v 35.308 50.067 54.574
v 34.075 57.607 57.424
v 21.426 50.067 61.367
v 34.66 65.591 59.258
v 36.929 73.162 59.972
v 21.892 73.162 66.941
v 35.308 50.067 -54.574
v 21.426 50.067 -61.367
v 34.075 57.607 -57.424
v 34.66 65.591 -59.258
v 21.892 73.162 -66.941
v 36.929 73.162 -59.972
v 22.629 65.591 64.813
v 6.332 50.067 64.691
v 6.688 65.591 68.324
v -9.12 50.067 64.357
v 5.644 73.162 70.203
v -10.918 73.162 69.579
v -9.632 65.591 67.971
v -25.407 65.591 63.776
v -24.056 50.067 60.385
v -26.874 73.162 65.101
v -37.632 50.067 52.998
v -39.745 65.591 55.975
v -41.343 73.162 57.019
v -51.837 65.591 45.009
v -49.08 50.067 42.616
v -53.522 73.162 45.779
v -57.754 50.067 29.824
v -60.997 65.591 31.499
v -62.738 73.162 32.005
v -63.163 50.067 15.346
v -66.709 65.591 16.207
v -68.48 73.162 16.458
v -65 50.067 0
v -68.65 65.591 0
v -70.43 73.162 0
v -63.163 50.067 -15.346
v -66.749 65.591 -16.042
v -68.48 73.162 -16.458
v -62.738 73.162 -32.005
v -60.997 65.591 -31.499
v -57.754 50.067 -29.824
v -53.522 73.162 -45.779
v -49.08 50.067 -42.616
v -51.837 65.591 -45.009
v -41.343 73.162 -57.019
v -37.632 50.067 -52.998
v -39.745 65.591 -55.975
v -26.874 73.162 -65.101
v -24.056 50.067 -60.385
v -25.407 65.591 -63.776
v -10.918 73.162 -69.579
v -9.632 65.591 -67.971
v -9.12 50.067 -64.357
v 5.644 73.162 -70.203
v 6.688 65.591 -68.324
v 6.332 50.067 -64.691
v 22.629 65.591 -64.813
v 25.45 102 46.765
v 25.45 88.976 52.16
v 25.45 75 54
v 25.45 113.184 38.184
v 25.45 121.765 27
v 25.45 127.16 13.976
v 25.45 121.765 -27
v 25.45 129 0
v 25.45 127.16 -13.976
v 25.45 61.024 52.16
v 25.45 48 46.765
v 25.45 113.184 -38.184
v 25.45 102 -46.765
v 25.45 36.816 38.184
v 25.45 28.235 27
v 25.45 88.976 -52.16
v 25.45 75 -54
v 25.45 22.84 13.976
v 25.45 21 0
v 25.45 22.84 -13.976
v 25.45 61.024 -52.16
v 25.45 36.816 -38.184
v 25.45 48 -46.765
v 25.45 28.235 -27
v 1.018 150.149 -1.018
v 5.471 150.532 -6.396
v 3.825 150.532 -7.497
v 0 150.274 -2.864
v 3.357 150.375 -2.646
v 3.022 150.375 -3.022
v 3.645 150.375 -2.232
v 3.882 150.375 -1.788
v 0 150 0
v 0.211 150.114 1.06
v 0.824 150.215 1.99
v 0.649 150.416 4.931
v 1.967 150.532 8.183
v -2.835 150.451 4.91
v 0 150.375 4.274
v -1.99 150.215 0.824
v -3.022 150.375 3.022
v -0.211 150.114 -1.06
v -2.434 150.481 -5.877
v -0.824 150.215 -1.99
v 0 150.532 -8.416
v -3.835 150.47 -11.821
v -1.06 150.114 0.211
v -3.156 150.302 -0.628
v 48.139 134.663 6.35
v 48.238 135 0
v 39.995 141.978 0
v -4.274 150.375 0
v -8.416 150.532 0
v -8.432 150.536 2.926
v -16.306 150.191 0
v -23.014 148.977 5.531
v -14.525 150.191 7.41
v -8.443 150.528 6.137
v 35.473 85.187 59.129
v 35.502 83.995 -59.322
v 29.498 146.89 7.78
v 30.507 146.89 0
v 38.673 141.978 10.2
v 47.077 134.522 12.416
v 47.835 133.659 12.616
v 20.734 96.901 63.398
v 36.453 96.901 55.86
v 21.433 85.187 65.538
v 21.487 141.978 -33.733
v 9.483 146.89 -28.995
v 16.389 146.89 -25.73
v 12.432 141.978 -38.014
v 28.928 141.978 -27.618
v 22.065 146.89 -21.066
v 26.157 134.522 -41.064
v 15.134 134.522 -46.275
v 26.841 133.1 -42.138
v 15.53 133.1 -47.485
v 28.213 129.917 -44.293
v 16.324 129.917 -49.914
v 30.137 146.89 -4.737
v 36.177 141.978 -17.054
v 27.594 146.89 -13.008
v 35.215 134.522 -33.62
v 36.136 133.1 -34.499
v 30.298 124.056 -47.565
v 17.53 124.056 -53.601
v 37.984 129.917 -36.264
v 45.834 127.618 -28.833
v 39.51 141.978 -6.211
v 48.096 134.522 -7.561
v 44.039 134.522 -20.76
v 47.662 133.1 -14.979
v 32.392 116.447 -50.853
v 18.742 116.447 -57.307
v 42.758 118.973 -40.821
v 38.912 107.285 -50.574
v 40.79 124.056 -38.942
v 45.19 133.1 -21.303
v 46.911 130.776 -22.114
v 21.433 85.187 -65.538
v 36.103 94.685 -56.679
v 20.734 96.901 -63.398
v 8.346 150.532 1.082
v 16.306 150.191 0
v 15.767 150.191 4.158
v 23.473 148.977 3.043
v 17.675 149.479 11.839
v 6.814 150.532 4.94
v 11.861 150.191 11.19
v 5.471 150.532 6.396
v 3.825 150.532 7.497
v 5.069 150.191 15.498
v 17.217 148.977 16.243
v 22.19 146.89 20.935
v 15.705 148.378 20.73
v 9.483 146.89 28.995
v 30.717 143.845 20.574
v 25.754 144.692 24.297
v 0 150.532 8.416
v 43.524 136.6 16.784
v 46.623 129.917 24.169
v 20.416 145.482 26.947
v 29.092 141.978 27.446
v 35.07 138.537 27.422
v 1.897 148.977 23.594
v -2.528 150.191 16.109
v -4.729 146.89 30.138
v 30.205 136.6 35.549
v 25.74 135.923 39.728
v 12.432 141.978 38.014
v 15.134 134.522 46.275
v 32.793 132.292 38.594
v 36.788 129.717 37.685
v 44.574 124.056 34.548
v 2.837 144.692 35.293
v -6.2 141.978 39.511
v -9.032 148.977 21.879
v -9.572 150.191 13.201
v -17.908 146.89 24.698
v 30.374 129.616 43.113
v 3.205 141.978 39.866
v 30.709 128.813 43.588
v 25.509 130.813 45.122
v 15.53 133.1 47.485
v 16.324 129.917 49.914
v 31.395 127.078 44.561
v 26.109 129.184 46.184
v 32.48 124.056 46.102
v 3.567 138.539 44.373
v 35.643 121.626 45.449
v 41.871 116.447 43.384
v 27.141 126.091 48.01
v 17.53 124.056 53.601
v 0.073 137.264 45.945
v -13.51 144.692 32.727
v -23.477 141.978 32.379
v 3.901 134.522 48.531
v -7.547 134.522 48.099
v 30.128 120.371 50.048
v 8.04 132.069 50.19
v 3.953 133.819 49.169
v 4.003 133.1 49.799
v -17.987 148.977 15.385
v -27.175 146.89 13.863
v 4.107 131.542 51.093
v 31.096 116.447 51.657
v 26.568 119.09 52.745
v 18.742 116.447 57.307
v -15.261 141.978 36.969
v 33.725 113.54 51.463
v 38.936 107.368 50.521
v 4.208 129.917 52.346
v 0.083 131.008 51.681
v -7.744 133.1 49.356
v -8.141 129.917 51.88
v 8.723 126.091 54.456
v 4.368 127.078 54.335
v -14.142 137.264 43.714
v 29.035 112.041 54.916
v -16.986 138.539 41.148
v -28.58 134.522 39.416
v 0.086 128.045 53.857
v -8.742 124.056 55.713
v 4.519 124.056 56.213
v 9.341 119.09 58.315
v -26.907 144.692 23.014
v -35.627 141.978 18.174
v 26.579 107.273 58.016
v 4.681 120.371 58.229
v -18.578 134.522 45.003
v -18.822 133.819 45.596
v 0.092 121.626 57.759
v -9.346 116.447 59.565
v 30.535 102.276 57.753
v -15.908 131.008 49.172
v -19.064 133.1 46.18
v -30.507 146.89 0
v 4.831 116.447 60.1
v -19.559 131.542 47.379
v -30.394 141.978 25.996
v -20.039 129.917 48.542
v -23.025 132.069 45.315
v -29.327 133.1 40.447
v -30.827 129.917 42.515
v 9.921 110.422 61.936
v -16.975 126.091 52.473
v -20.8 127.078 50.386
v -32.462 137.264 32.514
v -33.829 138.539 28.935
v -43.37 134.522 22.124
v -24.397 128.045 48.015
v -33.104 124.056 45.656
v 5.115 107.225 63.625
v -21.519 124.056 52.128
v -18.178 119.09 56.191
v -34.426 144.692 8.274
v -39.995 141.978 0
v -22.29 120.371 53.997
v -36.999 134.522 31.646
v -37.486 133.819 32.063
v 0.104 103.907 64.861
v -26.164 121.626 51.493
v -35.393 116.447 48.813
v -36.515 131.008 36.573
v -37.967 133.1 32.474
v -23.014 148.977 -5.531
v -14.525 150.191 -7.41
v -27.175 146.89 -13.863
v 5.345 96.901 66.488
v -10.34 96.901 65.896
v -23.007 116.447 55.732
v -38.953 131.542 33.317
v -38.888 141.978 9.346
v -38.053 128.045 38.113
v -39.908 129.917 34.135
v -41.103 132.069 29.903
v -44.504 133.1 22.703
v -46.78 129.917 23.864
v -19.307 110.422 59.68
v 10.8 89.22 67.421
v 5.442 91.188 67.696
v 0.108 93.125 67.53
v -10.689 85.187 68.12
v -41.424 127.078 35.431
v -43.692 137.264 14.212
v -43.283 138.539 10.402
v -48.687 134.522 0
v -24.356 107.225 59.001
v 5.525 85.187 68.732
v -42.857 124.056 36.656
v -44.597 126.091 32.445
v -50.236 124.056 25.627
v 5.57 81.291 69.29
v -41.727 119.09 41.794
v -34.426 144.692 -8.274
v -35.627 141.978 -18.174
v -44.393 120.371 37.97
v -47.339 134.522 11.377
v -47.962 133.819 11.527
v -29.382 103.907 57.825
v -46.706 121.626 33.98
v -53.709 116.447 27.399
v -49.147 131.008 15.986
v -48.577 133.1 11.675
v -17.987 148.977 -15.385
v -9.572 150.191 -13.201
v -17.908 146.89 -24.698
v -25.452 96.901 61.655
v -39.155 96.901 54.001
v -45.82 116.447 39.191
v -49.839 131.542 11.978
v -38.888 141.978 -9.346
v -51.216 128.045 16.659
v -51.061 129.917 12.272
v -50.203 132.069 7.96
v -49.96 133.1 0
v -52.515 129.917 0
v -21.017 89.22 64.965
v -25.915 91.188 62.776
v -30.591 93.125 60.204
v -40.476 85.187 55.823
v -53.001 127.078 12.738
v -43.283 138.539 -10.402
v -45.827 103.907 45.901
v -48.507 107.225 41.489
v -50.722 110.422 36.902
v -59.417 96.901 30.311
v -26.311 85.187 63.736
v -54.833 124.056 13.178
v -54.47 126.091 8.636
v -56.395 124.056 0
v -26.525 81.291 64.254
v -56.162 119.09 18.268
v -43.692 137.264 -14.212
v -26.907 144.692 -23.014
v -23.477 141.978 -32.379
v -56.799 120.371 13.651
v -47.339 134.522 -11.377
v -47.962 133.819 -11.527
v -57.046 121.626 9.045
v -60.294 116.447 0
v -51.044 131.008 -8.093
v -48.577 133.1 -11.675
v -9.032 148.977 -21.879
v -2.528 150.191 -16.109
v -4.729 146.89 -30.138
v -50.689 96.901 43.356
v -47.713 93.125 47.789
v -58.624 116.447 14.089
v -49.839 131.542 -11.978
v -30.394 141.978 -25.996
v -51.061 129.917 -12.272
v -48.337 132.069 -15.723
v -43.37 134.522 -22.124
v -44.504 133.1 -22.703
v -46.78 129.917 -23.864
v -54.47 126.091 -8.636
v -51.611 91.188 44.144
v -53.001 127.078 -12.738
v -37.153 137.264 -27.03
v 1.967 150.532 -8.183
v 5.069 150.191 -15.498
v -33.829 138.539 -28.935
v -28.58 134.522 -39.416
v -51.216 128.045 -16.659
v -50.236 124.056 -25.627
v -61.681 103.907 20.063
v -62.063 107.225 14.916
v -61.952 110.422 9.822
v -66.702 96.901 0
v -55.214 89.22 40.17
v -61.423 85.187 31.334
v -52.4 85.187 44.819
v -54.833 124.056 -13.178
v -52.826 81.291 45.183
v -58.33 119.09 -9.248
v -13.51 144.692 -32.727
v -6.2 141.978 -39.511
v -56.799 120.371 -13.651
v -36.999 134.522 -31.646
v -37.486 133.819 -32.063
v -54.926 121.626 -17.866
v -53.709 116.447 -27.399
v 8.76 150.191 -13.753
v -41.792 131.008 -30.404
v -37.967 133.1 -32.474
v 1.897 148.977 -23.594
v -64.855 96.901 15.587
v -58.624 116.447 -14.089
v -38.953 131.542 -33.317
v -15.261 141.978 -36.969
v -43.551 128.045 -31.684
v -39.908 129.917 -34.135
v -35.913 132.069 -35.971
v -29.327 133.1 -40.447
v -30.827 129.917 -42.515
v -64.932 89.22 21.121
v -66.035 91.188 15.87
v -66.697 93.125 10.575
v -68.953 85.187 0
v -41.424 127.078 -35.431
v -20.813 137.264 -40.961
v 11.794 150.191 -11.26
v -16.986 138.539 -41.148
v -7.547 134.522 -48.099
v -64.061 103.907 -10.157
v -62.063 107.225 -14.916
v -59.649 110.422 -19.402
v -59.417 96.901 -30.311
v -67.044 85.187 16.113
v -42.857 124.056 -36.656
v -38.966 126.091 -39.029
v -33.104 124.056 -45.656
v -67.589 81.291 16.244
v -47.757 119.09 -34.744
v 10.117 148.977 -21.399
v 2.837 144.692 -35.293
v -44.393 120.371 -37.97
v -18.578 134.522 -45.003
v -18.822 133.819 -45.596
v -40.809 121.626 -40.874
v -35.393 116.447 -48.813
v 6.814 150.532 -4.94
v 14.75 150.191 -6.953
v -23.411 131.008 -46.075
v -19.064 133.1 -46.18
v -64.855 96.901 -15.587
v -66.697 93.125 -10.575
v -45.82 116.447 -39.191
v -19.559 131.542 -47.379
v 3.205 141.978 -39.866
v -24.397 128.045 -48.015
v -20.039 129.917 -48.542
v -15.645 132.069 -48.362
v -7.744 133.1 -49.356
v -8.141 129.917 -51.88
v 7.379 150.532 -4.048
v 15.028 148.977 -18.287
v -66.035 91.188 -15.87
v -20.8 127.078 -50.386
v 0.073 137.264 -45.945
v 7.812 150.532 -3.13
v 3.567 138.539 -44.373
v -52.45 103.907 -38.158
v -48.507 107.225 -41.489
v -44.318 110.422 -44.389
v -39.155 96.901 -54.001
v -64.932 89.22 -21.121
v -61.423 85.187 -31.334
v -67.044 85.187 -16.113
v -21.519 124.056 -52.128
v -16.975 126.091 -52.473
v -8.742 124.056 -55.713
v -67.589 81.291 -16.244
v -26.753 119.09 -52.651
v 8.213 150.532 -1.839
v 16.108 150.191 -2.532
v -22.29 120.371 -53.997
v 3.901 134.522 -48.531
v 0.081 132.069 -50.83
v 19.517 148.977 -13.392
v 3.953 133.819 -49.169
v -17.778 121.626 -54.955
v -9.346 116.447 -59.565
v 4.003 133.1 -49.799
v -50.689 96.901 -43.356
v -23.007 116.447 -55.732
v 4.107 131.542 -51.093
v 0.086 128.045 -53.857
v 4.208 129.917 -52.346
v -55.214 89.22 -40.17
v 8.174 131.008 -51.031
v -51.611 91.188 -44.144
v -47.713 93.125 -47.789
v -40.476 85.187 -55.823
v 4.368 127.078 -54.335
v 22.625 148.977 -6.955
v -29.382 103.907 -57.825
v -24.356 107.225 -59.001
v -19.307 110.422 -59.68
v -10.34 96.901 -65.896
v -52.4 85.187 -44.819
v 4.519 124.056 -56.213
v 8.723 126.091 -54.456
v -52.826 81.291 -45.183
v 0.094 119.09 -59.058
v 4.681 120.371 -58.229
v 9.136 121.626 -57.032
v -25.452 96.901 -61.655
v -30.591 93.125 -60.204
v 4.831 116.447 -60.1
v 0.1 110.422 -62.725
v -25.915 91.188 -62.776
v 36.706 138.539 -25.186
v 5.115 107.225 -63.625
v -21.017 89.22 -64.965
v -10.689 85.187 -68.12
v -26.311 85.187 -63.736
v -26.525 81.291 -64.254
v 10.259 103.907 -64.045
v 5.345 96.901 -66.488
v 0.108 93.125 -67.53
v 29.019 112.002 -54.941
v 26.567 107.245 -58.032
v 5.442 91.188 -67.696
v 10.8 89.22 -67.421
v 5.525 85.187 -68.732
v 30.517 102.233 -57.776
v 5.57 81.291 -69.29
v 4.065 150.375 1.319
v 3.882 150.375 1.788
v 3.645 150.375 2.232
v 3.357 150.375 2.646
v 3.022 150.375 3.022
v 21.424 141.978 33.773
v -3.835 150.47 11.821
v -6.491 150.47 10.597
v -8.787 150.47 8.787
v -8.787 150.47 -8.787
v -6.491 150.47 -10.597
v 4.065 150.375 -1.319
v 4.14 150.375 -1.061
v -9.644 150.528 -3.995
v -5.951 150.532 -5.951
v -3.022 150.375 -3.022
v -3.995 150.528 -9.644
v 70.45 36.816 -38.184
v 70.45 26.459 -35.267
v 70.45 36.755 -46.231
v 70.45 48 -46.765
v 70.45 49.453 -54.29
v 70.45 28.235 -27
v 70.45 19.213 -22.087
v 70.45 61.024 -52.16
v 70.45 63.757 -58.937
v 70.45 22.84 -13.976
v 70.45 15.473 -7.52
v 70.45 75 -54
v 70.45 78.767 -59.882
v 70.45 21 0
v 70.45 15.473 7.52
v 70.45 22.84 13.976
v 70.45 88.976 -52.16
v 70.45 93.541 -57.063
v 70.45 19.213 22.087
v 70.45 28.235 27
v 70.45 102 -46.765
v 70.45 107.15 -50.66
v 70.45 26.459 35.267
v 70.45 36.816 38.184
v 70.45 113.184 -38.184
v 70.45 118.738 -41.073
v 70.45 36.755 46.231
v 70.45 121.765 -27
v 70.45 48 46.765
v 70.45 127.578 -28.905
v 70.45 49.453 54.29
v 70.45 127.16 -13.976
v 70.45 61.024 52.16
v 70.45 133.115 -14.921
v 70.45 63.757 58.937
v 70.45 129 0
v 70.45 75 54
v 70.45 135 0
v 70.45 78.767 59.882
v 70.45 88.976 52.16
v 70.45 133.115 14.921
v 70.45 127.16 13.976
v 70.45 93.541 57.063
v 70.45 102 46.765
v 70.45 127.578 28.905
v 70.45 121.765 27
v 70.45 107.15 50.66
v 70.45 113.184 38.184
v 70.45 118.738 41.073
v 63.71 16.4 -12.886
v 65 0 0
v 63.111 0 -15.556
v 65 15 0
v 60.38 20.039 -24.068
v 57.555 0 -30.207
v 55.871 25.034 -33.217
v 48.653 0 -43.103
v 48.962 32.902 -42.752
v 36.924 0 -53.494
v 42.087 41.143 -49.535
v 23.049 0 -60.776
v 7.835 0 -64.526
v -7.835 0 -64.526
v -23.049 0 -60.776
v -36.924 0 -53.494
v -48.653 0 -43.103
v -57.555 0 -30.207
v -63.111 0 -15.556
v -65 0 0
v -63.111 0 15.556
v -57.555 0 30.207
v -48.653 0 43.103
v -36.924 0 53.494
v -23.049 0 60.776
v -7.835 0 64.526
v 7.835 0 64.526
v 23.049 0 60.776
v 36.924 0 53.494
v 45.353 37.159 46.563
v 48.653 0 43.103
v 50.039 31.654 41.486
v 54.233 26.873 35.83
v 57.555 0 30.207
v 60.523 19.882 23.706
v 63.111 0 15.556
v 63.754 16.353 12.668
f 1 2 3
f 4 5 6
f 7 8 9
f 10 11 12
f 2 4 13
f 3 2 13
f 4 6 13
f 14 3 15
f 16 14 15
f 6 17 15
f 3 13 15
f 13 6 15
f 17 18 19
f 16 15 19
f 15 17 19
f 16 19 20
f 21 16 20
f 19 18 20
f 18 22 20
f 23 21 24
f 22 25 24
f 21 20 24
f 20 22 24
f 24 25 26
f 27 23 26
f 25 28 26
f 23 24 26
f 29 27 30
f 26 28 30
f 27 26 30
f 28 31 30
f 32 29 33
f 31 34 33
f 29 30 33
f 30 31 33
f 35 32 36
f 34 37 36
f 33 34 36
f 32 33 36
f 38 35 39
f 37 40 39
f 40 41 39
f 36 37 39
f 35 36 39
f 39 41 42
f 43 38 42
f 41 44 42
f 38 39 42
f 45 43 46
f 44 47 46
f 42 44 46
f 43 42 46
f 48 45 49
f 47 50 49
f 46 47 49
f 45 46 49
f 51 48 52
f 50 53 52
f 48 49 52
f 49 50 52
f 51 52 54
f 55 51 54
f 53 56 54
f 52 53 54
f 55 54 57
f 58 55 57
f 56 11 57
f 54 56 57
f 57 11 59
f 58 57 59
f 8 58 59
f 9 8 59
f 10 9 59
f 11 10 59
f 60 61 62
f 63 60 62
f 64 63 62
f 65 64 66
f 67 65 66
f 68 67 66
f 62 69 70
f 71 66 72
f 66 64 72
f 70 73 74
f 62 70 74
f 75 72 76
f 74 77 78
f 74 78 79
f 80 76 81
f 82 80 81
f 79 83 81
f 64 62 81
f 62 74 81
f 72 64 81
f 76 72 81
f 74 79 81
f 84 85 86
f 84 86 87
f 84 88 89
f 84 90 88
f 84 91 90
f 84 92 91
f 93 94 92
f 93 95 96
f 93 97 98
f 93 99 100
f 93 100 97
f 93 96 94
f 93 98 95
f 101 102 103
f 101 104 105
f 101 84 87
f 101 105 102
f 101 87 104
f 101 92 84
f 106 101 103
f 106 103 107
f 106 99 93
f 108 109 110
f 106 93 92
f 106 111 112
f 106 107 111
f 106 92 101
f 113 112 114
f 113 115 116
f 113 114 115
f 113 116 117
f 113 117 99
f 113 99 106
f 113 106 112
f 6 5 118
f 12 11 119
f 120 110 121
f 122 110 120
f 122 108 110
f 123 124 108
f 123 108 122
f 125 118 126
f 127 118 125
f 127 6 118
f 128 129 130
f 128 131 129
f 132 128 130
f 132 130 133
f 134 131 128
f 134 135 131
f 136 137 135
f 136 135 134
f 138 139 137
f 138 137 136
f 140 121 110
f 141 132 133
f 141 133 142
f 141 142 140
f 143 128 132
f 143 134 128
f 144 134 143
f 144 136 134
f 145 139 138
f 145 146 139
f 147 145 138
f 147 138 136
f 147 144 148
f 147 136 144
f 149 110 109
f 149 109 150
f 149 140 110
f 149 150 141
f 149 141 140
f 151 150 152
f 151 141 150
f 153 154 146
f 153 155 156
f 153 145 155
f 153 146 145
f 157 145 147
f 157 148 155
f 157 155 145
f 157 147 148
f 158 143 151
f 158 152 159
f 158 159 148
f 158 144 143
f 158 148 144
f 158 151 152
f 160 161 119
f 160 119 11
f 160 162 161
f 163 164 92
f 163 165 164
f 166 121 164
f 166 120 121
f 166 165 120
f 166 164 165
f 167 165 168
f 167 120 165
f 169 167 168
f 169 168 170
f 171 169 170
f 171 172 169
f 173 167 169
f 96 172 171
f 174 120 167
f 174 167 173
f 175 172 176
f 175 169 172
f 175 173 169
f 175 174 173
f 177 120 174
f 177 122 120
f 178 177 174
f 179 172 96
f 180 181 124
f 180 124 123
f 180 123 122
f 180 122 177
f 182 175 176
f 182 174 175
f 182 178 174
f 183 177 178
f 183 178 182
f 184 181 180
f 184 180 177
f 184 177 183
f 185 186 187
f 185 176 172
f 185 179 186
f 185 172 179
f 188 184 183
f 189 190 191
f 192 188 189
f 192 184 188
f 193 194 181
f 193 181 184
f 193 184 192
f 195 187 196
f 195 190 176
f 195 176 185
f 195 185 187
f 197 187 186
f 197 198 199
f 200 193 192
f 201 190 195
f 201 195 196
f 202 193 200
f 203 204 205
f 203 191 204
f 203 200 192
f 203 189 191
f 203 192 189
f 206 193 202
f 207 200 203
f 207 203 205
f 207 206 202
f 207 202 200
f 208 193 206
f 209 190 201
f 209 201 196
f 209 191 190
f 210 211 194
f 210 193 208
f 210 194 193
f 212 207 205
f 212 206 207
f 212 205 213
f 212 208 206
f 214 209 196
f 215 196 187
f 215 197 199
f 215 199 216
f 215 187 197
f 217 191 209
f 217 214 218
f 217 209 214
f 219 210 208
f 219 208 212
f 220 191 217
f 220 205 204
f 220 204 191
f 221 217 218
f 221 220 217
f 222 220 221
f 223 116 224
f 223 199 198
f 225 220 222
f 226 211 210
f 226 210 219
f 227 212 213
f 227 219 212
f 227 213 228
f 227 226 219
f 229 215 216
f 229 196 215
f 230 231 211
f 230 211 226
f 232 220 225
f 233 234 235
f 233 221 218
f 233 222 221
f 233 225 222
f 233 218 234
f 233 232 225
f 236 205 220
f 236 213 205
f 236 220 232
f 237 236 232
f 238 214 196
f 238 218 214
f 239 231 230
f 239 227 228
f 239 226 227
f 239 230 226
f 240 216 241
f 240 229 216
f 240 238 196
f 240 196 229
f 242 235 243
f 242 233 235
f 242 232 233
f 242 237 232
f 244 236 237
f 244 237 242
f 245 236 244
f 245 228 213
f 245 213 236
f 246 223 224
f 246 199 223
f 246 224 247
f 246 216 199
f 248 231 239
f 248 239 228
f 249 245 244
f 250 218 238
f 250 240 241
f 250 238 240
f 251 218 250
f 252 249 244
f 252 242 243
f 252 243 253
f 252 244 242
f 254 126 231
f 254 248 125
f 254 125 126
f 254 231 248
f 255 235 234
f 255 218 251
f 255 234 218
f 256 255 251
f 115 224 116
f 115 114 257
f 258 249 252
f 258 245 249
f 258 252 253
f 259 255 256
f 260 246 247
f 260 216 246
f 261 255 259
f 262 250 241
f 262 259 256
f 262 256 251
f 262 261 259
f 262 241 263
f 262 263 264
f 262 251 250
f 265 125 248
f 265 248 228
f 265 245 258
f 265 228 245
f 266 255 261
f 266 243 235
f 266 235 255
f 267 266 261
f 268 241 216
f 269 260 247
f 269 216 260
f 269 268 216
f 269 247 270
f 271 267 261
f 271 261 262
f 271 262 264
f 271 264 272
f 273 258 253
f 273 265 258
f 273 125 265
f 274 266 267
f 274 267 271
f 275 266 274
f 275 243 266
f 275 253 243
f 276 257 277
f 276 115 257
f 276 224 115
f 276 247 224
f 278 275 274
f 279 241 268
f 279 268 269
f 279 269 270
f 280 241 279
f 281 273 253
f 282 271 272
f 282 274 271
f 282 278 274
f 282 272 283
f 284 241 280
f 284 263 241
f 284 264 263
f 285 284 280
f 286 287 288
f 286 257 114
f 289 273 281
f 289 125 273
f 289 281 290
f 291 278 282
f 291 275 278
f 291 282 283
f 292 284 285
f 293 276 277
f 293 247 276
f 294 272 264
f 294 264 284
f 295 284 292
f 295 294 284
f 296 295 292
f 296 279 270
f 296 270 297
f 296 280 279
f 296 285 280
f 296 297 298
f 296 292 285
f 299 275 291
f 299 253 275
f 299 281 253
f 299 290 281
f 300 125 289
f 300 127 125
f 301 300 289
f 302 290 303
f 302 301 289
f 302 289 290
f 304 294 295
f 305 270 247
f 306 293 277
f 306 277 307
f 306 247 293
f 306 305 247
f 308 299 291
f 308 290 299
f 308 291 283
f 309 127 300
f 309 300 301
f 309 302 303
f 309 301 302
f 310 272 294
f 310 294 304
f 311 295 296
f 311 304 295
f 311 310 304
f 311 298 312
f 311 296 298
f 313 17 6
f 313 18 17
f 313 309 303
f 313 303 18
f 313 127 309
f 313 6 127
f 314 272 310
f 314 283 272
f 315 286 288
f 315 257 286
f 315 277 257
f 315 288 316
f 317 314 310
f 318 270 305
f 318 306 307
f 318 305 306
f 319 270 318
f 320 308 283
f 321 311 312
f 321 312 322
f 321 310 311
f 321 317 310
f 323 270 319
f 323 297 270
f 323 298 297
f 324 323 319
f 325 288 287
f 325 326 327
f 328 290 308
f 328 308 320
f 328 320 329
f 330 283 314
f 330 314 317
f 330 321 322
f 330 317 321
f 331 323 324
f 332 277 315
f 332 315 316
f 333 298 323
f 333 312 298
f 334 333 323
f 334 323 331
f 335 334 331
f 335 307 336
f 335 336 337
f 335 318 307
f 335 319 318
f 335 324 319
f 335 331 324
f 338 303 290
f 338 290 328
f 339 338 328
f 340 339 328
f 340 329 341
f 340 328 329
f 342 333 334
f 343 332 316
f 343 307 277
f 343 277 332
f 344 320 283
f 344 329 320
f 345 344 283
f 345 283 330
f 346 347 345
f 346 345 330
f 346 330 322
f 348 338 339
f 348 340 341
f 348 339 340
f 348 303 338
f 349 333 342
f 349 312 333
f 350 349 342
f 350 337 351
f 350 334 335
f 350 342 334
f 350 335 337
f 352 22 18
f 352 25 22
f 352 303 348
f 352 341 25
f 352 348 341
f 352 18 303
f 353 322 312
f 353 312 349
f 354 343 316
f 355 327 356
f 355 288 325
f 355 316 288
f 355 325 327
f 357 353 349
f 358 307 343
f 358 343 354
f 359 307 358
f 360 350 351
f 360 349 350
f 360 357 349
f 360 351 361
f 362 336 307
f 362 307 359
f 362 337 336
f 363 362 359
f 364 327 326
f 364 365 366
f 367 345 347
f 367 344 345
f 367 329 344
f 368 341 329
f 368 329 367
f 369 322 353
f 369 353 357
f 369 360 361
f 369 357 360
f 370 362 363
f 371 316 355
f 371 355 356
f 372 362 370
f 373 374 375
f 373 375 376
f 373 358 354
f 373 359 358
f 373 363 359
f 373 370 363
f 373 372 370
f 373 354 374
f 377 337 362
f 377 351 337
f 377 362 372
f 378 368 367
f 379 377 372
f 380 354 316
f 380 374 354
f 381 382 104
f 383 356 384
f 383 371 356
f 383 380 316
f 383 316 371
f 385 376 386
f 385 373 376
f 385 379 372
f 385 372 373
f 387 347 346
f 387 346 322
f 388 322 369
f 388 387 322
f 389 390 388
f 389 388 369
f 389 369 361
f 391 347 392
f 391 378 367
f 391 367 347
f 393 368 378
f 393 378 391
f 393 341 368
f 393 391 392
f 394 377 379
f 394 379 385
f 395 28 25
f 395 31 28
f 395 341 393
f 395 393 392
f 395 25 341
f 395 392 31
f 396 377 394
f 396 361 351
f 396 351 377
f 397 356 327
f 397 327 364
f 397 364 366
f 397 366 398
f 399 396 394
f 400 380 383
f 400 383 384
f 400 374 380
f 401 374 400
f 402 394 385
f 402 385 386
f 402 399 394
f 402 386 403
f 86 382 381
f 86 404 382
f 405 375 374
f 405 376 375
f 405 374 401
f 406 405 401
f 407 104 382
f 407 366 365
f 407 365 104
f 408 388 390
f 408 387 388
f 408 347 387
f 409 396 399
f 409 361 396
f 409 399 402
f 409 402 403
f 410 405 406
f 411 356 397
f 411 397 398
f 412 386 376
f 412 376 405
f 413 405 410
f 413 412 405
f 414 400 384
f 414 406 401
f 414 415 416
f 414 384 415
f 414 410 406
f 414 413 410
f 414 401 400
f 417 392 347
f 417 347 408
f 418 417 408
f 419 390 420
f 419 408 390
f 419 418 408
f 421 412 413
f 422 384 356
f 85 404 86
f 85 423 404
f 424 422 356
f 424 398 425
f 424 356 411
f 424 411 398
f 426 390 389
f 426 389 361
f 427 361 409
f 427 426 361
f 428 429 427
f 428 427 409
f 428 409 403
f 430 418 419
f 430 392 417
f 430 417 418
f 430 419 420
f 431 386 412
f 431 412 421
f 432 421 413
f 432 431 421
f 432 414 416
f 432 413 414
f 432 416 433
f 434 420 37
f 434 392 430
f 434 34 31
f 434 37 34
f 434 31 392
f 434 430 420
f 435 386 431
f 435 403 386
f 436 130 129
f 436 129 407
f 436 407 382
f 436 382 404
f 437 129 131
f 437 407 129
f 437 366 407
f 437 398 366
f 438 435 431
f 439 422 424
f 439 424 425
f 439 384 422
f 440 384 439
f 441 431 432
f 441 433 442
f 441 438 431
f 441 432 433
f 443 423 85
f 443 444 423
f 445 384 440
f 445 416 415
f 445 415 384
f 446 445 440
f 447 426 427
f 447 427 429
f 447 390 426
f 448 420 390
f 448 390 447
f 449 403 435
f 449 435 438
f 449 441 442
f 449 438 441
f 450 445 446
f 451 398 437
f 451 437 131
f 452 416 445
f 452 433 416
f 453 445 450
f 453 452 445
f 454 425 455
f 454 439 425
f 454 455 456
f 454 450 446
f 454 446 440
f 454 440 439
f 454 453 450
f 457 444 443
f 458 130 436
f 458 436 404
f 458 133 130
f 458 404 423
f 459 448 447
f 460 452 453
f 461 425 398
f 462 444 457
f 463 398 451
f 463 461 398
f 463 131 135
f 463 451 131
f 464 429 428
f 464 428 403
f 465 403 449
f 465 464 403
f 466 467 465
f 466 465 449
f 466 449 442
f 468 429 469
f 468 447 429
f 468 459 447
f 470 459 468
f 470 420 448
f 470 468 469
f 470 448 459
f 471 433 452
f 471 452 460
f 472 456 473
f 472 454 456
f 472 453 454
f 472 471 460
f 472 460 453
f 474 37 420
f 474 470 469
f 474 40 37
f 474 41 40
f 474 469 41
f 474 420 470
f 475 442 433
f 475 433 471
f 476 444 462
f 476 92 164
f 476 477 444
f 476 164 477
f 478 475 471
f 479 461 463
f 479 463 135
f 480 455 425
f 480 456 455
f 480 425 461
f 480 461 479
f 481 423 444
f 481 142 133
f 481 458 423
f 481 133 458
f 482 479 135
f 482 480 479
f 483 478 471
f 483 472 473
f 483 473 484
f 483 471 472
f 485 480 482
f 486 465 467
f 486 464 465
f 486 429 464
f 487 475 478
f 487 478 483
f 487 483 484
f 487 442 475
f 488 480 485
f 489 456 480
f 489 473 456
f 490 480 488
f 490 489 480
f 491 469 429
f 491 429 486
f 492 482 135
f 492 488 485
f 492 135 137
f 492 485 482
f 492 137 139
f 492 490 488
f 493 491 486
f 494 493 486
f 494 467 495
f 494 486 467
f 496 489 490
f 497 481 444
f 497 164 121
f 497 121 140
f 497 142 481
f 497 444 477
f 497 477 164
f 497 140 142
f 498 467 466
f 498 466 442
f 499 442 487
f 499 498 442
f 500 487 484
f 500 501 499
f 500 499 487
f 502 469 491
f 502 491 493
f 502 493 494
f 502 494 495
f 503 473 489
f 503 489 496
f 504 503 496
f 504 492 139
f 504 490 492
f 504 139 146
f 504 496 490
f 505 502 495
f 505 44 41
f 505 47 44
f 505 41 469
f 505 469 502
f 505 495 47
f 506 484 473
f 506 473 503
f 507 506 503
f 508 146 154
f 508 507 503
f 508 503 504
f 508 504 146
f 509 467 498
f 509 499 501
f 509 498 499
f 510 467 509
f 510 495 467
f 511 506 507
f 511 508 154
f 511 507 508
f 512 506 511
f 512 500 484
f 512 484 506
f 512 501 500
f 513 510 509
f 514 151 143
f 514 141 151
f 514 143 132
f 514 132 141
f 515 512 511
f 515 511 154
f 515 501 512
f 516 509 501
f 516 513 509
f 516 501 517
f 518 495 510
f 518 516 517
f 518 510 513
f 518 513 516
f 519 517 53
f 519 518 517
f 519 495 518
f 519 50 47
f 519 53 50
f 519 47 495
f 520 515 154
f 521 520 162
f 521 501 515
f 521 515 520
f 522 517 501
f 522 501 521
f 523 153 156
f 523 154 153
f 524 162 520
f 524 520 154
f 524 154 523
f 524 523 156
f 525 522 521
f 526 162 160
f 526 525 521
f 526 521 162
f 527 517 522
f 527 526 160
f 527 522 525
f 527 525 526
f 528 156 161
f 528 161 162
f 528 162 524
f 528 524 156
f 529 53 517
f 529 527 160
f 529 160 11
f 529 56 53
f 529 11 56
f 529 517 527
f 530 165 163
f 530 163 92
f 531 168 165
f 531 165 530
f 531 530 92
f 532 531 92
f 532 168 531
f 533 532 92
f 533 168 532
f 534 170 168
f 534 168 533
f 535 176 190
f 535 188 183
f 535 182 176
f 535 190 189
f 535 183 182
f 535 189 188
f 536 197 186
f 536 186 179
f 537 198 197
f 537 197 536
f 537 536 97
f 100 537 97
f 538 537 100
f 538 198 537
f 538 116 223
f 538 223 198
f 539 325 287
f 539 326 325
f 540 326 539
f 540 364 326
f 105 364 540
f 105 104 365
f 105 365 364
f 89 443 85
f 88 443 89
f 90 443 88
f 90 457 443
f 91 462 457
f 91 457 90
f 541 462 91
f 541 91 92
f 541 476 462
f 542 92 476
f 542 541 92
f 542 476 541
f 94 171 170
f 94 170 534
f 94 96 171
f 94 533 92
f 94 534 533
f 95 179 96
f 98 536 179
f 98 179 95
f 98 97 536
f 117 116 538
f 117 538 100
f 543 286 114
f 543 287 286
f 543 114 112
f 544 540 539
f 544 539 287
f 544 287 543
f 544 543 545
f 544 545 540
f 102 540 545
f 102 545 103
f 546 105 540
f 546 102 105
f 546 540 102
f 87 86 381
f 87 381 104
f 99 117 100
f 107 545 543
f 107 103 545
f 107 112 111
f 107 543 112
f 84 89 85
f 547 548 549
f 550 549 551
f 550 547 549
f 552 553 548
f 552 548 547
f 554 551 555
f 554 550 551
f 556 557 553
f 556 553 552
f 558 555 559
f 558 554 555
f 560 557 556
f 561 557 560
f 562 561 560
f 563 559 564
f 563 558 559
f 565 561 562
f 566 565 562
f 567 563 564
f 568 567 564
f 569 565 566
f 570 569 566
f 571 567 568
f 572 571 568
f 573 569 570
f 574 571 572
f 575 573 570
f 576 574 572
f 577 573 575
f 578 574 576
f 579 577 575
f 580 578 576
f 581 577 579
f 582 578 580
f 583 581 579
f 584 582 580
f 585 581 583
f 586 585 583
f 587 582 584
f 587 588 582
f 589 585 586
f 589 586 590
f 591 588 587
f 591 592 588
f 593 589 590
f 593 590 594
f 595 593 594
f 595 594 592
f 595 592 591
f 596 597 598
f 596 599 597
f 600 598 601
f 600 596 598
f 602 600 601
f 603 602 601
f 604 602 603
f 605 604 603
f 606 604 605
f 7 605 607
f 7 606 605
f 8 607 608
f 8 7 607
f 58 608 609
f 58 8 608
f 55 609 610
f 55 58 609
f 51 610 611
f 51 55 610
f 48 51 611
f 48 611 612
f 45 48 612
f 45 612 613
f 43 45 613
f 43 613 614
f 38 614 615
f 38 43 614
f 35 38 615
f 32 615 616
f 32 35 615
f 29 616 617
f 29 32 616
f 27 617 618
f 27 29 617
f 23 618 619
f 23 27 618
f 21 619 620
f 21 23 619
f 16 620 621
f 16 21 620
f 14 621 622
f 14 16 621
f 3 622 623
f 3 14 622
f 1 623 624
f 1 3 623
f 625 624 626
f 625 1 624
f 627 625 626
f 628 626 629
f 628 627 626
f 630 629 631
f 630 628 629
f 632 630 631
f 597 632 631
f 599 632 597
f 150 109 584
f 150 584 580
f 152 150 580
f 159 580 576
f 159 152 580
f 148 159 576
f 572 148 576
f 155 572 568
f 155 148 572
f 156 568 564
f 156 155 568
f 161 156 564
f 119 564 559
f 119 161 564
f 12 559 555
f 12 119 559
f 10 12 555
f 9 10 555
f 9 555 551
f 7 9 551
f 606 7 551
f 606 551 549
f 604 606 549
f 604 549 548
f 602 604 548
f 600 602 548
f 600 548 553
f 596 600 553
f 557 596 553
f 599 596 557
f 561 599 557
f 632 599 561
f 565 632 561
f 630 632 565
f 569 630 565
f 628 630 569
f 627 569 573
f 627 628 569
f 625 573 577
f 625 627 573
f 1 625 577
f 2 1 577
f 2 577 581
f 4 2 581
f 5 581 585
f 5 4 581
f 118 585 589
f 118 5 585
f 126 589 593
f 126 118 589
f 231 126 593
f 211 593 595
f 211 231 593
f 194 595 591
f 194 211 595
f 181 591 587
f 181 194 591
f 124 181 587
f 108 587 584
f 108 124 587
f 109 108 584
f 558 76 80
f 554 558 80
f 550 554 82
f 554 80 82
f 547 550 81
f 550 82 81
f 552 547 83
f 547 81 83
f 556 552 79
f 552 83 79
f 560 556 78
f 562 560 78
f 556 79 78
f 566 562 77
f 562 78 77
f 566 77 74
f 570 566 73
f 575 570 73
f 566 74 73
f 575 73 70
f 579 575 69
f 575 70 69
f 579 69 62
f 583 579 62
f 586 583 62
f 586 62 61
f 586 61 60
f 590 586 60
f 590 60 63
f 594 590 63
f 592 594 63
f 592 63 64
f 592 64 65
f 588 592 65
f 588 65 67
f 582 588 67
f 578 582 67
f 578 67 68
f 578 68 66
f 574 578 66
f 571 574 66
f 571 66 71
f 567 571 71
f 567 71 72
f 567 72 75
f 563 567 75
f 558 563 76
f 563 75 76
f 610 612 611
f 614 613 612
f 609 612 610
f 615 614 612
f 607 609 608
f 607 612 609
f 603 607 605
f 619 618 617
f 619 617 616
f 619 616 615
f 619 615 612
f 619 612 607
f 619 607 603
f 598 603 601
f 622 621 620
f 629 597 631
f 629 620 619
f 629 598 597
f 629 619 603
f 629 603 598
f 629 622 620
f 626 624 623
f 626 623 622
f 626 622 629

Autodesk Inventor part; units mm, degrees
ref_plane "YZ Plane" through (0, 0, 0) normal (1, 0, 0) x (0, 1, 0)
ref_plane "XZ Plane" through (0, 0, 0) normal (0, 1, 0) x (-1, 0, 0)
ref_plane "XY Plane" through (0, 0, 0) normal (0, 0, 1) x (1, 0, 0)
sketch "Sketch1" plane through (0, 0, 0) normal (0, 0, 1) x (1, 0, 0)
  line L0 (0, 0) -> (65, 0)
  line L1 (0, 126.1861) -> (0, 150)
  line L2 (0, 18.2402) -> (0, 0)
  line L3 (0, 126.1861) -> (0, 18.2402)
  line L4 (65, 0) -> (65, 50.0668)
  line L5 (0, 150) -> (62.6016, 156.9829) construction
  line L6 (62.6016, 156.9829) -> (70.4299, 73.1619) construction
  spline S0 degree 2 poles (0, 150) (62.6016, 156.9829) (70.4299, 73.1619) knots 1 1 1 2 2 2
  line L7 (65, 50.0668) -> (70.4299, 73.1619) construction
  spline S1 degree 1 poles (65, 50.0668) (70.4299, 73.1619) knots 1 1 2 2
  point P0 (84.7515, 38.5438)
  dimension "d1" = 65
  dimension "d2" = 150
revolve "Revolution1" add sketch "Sketch1" angle 360 about axis through (0, 126.1861, 0) along (0, -1, 0)
sketch "Sketch2" plane through (0, 0, 0) normal (1, 0, 0) x (0, 1, 0)
  line L0 (0, 75) -> (0, -75) projected
  circle A0 centre (75, 0) radius 60
  point P0 (0, 0)
  point P1 (150, 0)
  dimension "d4" = 120
  dimension "d25" = 75
extrude "Extrusion1" add sketch "Sketch2" along normal blind 70.45
hole "Hole1" at (70.45, 75, 0) direction (-1, 0, 0) diameter 108 depth 45
properties part number "tete2"
